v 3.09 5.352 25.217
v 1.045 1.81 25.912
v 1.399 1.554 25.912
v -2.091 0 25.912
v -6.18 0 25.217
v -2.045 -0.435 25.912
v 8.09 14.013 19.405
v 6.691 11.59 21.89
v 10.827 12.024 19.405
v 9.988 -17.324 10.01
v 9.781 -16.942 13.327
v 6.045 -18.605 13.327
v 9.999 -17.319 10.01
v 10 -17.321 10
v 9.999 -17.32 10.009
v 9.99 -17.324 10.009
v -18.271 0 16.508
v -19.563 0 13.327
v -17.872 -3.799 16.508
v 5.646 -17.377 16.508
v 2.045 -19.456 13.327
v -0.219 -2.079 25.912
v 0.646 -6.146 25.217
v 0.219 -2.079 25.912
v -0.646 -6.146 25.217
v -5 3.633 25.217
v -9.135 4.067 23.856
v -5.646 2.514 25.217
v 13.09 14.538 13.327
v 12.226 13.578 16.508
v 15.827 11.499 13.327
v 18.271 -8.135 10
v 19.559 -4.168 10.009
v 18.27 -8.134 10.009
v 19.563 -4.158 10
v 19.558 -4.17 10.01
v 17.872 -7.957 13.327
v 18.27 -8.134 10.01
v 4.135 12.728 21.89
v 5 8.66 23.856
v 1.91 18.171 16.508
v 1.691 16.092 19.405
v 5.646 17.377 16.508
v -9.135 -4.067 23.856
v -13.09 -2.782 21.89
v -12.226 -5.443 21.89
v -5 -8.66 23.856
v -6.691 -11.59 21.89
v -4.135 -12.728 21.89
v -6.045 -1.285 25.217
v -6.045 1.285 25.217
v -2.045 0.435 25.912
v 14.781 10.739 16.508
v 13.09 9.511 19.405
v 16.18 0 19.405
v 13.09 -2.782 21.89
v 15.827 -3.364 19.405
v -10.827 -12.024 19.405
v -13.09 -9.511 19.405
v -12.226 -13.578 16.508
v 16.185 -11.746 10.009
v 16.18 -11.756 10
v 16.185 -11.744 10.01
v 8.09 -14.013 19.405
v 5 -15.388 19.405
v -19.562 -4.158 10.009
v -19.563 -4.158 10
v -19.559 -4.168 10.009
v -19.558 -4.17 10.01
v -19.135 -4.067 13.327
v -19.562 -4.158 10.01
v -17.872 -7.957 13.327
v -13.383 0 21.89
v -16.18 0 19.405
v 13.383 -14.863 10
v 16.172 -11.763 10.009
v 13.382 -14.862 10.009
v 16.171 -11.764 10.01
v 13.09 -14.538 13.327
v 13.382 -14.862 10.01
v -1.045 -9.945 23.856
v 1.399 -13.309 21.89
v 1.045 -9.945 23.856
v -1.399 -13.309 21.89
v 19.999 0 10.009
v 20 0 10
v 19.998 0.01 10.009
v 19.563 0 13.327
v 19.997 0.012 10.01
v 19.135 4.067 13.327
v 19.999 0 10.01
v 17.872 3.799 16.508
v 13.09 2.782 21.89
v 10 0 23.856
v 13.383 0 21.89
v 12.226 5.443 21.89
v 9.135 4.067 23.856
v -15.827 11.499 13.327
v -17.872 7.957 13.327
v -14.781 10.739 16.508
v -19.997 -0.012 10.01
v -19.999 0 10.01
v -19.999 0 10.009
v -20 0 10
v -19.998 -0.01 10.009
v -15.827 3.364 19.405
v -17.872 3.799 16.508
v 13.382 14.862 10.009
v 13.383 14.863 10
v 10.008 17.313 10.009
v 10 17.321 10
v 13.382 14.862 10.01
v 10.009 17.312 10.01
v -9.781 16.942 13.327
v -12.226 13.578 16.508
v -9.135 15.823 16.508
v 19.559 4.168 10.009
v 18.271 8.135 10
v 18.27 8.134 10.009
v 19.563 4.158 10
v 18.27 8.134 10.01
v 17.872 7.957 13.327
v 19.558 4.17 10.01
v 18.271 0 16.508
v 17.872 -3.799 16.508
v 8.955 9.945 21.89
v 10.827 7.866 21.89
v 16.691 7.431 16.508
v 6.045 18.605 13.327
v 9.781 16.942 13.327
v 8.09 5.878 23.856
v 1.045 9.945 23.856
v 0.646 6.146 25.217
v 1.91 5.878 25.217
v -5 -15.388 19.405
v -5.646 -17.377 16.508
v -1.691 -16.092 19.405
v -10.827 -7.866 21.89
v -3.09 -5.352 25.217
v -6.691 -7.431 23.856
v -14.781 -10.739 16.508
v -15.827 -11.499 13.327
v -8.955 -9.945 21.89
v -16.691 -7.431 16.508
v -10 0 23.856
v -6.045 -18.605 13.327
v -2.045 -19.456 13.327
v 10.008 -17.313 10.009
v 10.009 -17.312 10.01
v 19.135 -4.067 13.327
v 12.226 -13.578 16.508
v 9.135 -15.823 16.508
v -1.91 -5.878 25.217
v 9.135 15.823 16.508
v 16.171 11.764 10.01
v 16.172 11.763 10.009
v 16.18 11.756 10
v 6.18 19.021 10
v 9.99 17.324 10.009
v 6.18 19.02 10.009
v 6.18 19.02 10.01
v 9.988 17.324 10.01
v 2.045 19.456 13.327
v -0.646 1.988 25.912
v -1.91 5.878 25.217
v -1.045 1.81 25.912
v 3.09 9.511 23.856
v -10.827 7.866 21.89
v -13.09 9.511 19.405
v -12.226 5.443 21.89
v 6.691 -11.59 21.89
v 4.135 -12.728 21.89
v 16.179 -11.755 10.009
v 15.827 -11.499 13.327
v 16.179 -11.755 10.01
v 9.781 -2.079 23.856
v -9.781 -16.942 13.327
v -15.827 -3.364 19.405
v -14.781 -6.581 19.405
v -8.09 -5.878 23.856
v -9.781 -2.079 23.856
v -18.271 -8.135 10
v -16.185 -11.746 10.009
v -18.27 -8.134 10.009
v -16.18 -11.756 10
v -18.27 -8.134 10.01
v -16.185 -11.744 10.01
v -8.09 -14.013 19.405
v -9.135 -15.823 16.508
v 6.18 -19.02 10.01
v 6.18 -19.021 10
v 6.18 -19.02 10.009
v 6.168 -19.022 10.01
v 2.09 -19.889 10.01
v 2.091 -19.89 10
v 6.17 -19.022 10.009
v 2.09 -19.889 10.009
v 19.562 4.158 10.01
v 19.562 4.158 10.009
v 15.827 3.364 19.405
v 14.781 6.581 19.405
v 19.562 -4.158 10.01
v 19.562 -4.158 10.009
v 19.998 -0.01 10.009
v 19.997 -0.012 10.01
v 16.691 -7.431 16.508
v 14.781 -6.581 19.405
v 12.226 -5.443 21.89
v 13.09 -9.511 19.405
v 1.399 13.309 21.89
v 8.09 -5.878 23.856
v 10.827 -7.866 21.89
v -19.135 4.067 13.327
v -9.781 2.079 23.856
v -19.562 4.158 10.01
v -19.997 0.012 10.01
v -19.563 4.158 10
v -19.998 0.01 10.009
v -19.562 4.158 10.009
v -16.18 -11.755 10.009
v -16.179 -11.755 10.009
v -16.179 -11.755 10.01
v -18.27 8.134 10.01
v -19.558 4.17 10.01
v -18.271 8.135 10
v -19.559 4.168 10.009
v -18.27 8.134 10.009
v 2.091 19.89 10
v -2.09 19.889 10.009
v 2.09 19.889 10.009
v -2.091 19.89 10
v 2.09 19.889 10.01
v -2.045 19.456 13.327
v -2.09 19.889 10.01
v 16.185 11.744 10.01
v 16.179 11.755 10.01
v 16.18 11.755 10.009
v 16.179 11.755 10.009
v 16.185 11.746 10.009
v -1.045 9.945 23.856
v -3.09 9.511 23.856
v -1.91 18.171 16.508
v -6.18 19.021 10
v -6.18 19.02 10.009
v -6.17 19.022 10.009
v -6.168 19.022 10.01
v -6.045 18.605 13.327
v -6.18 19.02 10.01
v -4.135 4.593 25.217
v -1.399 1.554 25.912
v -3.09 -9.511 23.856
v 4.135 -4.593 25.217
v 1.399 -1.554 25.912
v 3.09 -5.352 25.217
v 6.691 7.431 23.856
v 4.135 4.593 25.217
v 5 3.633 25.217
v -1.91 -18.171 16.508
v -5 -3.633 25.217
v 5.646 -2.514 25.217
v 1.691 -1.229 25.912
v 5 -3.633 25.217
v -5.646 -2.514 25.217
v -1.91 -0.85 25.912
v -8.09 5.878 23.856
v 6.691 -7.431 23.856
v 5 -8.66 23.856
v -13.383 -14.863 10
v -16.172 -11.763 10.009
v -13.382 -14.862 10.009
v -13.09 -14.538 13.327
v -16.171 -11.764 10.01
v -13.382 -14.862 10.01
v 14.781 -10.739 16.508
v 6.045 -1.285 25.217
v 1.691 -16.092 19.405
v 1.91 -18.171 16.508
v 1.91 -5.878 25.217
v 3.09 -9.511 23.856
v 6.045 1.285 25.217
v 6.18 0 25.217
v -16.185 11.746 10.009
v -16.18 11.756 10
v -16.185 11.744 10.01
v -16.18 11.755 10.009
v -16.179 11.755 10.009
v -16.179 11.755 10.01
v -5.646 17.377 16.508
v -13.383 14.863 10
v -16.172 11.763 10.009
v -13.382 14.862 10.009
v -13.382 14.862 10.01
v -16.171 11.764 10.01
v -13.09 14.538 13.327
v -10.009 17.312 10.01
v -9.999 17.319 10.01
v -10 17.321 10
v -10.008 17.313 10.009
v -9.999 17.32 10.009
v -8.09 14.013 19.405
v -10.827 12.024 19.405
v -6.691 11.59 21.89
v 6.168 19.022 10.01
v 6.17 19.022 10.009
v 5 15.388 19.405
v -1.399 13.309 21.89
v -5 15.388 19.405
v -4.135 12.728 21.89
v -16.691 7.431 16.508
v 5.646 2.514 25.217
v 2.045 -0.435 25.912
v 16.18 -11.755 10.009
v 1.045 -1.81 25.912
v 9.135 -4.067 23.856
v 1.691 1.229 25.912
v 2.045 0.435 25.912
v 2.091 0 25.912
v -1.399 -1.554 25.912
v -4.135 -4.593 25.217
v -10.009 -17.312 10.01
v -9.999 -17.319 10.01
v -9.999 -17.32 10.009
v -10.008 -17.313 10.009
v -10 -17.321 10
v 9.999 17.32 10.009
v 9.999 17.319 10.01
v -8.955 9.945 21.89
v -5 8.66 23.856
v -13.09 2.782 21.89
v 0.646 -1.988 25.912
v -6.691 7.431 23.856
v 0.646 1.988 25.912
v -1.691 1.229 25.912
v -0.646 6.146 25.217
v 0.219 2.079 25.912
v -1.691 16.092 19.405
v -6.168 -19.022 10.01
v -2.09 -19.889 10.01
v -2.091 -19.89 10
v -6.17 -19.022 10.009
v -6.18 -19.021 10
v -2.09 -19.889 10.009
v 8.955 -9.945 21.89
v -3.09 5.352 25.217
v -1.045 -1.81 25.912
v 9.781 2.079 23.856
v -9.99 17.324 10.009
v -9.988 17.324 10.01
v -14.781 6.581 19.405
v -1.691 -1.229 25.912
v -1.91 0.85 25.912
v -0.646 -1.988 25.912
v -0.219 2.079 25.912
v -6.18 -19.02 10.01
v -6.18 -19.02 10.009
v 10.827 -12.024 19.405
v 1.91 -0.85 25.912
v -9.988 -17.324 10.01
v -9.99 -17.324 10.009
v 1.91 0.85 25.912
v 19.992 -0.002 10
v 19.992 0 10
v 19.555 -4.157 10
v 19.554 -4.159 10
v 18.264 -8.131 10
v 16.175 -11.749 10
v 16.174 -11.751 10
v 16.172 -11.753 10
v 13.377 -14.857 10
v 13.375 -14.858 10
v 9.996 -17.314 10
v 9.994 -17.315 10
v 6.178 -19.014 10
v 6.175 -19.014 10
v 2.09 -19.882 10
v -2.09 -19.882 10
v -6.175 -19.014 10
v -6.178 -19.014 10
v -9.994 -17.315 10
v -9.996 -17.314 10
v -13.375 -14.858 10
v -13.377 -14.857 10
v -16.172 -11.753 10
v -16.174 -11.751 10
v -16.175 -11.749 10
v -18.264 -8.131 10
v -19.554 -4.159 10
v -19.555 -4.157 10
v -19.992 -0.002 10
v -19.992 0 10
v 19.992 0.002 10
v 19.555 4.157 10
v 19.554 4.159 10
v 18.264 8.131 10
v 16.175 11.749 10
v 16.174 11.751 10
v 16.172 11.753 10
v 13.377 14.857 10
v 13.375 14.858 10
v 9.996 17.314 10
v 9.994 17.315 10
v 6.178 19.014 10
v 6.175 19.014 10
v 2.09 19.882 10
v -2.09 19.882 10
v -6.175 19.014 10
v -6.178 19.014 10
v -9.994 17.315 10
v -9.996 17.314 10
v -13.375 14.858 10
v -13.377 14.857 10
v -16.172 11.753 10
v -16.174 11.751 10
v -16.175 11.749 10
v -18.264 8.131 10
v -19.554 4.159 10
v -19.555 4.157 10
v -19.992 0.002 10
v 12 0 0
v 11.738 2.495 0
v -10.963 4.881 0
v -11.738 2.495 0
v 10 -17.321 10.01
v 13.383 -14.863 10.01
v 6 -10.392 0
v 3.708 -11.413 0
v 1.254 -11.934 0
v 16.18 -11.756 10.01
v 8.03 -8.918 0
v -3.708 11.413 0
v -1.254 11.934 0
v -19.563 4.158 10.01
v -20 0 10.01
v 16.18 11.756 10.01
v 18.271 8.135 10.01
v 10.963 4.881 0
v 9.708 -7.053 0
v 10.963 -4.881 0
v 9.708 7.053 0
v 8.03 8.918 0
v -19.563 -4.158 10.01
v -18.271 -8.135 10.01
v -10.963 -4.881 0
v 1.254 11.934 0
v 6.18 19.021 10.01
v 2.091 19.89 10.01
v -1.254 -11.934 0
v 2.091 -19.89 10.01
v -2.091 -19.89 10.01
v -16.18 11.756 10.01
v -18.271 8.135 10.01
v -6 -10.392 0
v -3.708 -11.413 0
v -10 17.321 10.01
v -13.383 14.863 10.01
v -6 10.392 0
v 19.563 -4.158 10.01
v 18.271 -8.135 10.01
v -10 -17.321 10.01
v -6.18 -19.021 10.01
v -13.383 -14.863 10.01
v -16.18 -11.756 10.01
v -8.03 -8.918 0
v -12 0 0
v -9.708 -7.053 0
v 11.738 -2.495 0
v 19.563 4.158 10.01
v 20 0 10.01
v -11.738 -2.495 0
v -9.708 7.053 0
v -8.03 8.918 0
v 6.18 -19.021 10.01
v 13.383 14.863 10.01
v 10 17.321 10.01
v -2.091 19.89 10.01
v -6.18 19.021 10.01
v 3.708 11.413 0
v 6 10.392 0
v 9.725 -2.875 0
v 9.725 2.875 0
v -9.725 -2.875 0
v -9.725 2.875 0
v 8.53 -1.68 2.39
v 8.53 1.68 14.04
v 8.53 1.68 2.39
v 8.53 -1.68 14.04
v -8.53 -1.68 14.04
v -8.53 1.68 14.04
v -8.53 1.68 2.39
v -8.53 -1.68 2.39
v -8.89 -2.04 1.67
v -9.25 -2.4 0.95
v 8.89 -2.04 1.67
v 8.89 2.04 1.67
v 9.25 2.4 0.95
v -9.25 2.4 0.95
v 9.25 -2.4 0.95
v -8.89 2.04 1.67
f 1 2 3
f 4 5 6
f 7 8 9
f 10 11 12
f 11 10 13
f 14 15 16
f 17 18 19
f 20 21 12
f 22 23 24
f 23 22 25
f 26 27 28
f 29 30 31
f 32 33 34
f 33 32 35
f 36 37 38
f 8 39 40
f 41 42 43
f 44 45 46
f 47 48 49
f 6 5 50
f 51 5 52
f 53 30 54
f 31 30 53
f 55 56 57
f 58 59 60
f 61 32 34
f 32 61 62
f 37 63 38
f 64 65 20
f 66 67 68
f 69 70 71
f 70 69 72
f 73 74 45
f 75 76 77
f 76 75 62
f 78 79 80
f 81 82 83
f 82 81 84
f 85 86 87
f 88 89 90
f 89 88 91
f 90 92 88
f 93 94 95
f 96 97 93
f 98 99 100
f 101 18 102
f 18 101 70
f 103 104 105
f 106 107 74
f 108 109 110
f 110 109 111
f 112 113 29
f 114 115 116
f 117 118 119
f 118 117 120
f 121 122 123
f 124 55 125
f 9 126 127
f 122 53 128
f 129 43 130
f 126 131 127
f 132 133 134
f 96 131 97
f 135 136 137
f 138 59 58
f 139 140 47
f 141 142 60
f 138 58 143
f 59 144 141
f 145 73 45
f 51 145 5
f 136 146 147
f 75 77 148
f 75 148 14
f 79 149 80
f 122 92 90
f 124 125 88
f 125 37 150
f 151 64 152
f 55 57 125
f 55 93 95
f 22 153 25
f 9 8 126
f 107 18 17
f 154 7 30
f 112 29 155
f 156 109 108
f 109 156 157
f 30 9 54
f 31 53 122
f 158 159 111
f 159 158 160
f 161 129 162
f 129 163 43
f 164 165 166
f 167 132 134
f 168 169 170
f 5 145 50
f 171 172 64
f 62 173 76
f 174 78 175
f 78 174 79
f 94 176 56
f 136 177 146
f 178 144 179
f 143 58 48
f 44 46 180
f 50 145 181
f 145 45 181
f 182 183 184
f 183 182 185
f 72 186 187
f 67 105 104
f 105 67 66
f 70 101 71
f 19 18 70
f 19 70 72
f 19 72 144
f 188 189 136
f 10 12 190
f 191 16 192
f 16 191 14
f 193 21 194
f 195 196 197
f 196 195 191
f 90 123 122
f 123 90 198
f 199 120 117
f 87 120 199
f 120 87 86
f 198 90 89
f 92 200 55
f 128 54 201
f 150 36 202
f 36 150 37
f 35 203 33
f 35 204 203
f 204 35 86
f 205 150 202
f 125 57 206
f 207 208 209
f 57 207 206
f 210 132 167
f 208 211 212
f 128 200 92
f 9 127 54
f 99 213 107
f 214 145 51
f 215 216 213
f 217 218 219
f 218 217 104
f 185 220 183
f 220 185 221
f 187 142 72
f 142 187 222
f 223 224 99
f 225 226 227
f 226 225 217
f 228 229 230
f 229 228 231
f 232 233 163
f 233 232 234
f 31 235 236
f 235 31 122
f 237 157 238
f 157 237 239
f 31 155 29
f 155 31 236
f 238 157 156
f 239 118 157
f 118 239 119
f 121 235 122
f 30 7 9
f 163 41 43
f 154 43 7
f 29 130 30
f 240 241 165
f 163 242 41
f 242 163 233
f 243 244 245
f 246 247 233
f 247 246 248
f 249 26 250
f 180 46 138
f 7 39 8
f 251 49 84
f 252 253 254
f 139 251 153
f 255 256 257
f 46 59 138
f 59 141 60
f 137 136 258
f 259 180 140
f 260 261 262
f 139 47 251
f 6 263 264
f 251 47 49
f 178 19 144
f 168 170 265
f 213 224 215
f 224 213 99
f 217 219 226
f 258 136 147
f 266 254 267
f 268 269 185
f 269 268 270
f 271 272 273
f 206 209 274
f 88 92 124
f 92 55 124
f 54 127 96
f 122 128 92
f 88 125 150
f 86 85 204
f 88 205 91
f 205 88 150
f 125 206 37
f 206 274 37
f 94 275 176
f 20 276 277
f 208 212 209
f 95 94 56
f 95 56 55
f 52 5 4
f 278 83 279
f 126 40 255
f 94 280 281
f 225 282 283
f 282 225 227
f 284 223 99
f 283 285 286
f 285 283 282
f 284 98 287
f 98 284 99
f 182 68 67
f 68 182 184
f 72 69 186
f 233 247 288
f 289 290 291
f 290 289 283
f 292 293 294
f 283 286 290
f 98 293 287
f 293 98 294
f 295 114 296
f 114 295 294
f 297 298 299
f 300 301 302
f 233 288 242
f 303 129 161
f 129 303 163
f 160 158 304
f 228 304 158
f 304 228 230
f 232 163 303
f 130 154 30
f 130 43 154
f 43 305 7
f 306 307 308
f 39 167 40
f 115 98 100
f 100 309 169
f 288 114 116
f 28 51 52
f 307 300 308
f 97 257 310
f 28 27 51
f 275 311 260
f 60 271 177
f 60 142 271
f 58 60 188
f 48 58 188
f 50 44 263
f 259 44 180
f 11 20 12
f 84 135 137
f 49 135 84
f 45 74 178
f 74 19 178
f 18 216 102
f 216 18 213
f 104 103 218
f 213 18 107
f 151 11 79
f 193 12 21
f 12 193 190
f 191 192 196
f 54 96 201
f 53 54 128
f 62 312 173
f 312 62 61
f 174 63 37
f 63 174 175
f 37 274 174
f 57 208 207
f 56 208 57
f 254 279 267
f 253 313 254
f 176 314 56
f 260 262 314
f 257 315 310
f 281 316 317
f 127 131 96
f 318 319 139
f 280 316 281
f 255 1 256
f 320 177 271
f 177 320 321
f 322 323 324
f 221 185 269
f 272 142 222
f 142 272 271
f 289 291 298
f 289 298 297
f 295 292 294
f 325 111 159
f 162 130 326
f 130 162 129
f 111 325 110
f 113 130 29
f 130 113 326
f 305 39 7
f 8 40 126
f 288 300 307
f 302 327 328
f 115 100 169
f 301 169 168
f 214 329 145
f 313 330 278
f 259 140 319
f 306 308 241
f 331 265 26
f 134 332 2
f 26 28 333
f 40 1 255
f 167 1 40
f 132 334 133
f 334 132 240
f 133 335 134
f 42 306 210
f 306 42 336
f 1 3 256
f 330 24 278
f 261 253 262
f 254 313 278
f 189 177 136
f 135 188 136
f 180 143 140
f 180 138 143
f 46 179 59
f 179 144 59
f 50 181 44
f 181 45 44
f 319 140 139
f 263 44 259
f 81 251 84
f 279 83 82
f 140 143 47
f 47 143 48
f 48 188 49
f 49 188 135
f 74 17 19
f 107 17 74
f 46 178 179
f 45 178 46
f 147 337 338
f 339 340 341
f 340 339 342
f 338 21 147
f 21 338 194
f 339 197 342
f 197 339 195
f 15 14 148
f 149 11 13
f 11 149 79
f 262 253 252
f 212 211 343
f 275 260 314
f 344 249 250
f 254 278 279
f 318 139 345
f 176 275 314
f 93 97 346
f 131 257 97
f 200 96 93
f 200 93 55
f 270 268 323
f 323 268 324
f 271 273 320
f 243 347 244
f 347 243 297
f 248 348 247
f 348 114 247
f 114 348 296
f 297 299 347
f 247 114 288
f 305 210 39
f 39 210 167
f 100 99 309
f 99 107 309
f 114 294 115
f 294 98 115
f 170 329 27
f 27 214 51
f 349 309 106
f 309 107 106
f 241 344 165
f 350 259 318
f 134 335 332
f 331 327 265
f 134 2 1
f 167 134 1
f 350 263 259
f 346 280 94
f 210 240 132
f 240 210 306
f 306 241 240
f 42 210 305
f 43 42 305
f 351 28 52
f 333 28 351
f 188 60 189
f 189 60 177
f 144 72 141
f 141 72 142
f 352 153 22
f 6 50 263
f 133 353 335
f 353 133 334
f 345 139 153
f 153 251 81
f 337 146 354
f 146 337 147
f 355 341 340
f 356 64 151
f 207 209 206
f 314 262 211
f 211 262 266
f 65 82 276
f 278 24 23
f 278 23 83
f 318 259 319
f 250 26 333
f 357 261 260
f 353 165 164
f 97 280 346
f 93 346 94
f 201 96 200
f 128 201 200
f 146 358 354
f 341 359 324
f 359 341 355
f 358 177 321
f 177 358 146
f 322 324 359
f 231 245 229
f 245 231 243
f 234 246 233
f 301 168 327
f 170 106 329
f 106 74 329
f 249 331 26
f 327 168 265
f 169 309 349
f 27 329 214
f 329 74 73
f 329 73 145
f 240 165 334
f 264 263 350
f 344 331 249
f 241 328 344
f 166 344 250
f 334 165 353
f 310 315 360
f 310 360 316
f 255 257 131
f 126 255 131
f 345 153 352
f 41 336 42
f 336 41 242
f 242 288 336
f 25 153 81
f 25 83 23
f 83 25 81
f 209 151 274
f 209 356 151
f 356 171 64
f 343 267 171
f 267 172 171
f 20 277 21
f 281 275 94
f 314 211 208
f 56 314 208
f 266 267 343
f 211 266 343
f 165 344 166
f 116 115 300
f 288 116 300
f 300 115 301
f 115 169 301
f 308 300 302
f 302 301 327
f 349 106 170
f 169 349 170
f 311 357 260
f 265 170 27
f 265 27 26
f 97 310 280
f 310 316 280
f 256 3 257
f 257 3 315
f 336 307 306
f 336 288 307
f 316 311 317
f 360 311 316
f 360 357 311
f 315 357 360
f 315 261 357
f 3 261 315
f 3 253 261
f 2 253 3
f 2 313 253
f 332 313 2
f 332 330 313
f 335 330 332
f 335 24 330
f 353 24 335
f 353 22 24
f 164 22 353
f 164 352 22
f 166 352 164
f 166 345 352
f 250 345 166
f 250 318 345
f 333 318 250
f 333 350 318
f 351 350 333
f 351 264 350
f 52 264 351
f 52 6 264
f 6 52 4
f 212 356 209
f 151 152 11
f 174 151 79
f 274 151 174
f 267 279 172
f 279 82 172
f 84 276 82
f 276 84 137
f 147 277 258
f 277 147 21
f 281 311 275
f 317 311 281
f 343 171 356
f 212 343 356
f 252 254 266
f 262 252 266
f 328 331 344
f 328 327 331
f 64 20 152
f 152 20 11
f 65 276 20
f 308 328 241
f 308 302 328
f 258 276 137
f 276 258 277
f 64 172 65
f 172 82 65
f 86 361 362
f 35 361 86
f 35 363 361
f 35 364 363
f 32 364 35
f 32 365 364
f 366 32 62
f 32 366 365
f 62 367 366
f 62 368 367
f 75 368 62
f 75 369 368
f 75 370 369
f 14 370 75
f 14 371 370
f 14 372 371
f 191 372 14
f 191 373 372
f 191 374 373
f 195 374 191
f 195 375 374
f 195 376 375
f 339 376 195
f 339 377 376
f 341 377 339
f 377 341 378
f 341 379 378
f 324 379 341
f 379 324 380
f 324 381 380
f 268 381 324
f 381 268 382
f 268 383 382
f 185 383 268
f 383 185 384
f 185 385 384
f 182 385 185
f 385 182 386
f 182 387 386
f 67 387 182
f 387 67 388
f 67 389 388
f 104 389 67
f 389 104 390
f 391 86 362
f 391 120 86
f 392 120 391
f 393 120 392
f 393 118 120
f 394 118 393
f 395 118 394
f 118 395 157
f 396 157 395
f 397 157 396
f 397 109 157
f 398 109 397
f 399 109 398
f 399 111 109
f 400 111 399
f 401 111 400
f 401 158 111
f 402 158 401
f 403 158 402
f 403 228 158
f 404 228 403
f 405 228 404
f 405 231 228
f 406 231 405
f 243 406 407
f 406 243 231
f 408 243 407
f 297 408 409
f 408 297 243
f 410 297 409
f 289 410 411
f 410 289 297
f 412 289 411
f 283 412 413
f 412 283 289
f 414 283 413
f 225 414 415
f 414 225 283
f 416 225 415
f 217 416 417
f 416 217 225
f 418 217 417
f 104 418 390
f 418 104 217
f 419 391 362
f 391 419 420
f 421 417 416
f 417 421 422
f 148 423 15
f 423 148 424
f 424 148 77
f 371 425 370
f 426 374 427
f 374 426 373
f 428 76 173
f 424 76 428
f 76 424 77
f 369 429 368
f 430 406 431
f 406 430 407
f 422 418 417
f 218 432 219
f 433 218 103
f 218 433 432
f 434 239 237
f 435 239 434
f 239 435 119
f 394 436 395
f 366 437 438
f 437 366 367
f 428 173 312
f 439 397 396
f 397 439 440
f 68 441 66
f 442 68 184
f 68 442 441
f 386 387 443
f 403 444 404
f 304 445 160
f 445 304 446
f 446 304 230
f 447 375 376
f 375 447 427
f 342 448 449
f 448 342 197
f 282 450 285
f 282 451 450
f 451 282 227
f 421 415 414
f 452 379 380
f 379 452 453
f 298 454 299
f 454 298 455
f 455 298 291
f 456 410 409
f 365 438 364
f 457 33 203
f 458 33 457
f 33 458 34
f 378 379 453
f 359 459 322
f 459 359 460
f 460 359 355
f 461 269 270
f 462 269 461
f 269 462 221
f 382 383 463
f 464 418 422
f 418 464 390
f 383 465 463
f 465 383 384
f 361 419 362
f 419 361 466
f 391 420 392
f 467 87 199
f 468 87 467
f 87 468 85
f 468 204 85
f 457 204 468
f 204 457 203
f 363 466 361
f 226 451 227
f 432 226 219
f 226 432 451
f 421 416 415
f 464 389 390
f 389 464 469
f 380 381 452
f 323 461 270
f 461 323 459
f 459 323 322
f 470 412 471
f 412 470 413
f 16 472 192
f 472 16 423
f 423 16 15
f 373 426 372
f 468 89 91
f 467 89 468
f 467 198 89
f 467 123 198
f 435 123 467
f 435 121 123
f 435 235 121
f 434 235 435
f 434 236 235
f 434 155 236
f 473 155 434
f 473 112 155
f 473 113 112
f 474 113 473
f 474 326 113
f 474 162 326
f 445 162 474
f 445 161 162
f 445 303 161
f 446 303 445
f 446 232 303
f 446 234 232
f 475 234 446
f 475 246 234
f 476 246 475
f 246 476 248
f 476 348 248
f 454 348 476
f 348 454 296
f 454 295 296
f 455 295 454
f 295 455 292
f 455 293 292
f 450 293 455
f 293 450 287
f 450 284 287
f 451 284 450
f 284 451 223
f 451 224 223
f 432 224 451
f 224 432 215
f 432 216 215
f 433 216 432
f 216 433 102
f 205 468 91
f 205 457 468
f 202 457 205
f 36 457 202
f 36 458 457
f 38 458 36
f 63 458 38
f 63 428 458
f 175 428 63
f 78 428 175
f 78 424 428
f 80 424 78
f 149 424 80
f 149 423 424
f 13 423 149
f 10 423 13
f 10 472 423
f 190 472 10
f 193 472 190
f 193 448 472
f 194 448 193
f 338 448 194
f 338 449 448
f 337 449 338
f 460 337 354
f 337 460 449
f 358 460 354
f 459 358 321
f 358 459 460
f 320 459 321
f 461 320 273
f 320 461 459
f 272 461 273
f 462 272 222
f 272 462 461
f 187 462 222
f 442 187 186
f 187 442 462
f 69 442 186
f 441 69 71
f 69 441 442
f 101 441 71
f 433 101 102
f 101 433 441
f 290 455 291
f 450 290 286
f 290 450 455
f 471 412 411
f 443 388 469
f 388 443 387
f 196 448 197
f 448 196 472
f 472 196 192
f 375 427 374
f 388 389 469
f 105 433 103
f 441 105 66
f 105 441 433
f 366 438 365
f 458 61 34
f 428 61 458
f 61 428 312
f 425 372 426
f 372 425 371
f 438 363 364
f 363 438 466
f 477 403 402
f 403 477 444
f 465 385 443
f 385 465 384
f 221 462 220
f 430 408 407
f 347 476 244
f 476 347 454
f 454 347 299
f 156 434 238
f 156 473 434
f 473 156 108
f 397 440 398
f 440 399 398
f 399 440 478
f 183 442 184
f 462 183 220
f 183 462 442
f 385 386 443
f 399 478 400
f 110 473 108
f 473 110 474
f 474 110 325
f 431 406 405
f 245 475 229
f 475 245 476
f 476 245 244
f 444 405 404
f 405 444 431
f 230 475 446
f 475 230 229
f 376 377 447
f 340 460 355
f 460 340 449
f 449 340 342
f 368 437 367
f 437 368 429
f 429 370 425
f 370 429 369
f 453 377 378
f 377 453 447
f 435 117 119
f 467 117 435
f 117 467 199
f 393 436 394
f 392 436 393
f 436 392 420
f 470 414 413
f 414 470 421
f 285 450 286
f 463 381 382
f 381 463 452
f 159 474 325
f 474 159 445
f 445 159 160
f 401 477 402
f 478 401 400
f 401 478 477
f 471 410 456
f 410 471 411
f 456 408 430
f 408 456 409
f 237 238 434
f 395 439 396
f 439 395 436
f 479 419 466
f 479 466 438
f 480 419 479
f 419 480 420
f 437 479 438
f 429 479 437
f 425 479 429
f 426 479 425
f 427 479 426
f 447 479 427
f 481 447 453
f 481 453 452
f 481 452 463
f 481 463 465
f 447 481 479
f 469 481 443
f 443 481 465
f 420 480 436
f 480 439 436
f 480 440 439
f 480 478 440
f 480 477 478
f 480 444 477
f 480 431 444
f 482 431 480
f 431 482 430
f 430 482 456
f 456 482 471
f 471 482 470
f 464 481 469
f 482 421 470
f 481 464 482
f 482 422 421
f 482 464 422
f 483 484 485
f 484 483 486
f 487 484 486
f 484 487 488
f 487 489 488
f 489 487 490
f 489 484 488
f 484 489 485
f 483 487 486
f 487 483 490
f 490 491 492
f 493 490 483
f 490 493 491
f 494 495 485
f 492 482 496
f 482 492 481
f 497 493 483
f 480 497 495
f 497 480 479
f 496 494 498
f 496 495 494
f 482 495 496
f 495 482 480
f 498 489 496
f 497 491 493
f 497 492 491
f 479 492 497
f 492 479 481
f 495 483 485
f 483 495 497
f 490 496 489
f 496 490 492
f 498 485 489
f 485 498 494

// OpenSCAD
slotTolerance = 0.08;
slotWidth = 16.9;
slotThickness = 3.2;
slotHeight = 14;
bottomSlotExtra = 1.2;
baseDiameter = 24;
baseHeight = 10;
sphereDiameter = 40;
verticalSphereStretch = 0.8;

module end_of_parameters_dummy() {}


//BEGIN: use <tubemesh.scad>;

//BEGIN: use <eval.scad>;
function _isString(v) = v >= "";
function _isVector(v) = !(v>="") && len(v) != undef;
function _isFloat(v) = v+0 != undef;

function _substr(s, start=0, stop=undef, soFar = "") =
    start >= (stop==undef ? len(s) : stop) ? soFar :
        _substr(s, start=start+1, stop=stop, soFar=str(soFar, s[start]));

function _parseInt(s, start=0, stop=undef, accumulated=0) =
    let( stop = stop==undef ? len(s) : stop )
        start >= stop ? accumulated :
        s[start] == "+" ? _parseInt(s, start=start+1, stop=stop) :
        s[start] == "-" ? -_parseInt(s, start=start+1, stop=stop) :
        let (digit = search(s[start], "0123456789"))
            digit == [] ? 0 : _parseInt(s, start=start+1, stop=stop, accumulated=accumulated*10+digit[0]);

function _findNonDigit(s, start=0) =
    start >= len(s) || s[start]<"0" || s[start]>"9" ? start :
    _findNonDigit(s, start=start+1);

function _replaceChar(s,c1,c2,pos=0,soFar="") =
    pos >= len(s) ? soFar :
    _replaceChar(s,c1,c2,pos=pos+1,soFar=str(soFar, s[pos]==c1 ? c2 : s[pos]));

function _parseUnsignedFloat(s) =
    len(s) == 0 ? 0 :
        let(
            firstNonDigit = _findNonDigit(s),
            decimalPart = s[firstNonDigit]!="." ?
                [firstNonDigit,firstNonDigit] : [firstNonDigit+1, _findNonDigit(s, start=firstNonDigit+1)],
            intPart = _parseInt(s,start=0,stop=firstNonDigit),
            fractionPart = _parseInt(s,start=decimalPart[0],stop=decimalPart[1]),
            baseExp = s[decimalPart[1]]=="e" || s[decimalPart[1]]=="E" ? pow(10,_parseInt(s, start=decimalPart[1]+1)) : 1)
            (intPart+fractionPart*pow(10,-(decimalPart[1]-decimalPart[0])))*baseExp;

function _tail(v) = len(v)>=2 ? [for(i=[1:len(v)-1]) v[i]] : [];
function _isspace(c) = (" " == c || "\t" == c || "\r" == c || "\n" == c );
function _isdigit(c) = ("0" <= c && c <= "9" );
function _isalpha(c) = ("a" <= c && c <= "z") || ("A" <= c && c <= "Z");
function _isalpha_(c) = _isalpha(c)  || c=="_";
function _isalnum_(c) = _isalpha(c) || _isdigit(c) || c=="_";
function _flattenLists(ll) = [for(a=ll) for(b=a) b];

function _spaceSequence(s, start=0, count=0) =
    len(s)>start && _isspace(s[start]) ? _spaceSequence(s, start=start+1, count=count+1) : count;
function _digitSequence(s, start=0, count=0) =
    len(s)>start && _isdigit(s[start]) ? _digitSequence(s, start=start+1,count=count+1) : count;
function _alnum_Sequence(s, start=0, count=0) =
    len(s)>start && _isalnum_(s[start]) ? _alnum_Sequence(s, start=start+1,count=count+1) : count;
function _identifierSequence(s, start=0, count=0) =
    len(s)>start && _isalpha_(s[start]) ? _alnum_Sequence(s, start=start+1, count=count+1) : count;
function _signedDigitSequence(s, start=0) =
    len(s) <= start ? 0 :
        (s[start] == "+" || s[start] == "-" ) ? 1+_digitSequence(s,start=start+1) : _digitSequence(s,start=start);
function _realStartingWithDecimal(s, start=0) =
    len(s)>start && s[start] == "." ?
        let(next = start+1+_digitSequence(s, start=start+1))
        (s[next] == "e" || s[next] == "E" ?
            next-start+1+_signedDigitSequence(s, start=next+1) : next-start)
        : 0;
function _realContinuation(s, start=0) =
    len(s) <= start ? 0 :
        let(c1=_realStartingWithDecimal(s, start=start))
        c1 > 0 ? c1 :
        s[start] == "e" || s[start] == "E" ?
            1+_signedDigitSequence(s, start=start+1) : 0;
function _positiveRealSequence(s, start=0) =
    len(s) <= start ? 0 :
        let(c1 = _realStartingWithDecimal(s, start=start))
            c1 > 0 ? c1 :
        let(c2 = _digitSequence(s, start=start))
            c2 > 0 ? c2 + _realContinuation(s, start=start+c2) : 0;

_multiSymbolOperators = [ "<=", ">=", "==", "&&", "||" ]; // must be in order of decreasing length

function _multiSymbolOperatorSequence(s, start=0) =
    (s[start]=="<" && s[start+1]=="=") ||
    (s[start]==">" && s[start+1]=="=") ||
    (s[start]=="=" && s[start+1]=="=") ||
    (s[start]=="!" && s[start+1]=="=") ||
    (s[start]=="&" && s[start+1]=="&") ||
    (s[start]=="|" && s[start+1]=="|") ? 2 : 0;

function _tokenize(s, start=0) =
    start >= len(s) ? [] :
    let(c1=_spaceSequence(s, start=start)) c1>0 ?
        concat([" "], _tokenize(s, start=start+c1)) :
    let(c2=_identifierSequence(s, start=start)) c2>0 ?
        concat([_substr(s, start=start, stop=start+c2)], _tokenize(s, start=start+c2)) :
    let(c3=_positiveRealSequence(s, start=start)) c3>0 ?
        concat([_substr(s, start=start, stop=start+c3)], _tokenize(s, start=start+c3)) :
    let(c4=_multiSymbolOperatorSequence(s, start=start)) c4>0 ?
        concat([_substr(s, start=start, stop=start+c4)], _tokenize(s, start=start+c4)) :
        concat([s[start]], _tokenize(s, start=start+1));


function _endParens(list,start=0,openCount=0,stop=undef) =
    let(stop = stop==undef ? len(list) : stop)
    start >= stop ? (openCount?undef:stop) :
    list[start][0] == ")" ?
            (openCount==1 ? start+1 : _endParens(list,start+1,stop=stop, openCount=openCount-1)) :
    _endParens(list,start+1,stop=stop, openCount=
        list[start][0] == "(" ?
            openCount+1 : openCount);

function _indexInTable(string, table, column=0) =
    let (s=search([string], table, index_col_num=column))
        s[0] == [] ? -1 : s[0][0];

_NAME = 0;
_ARITY = 1;
_PREC = 2;
_ASSOC_DIR = 3;
_ARGUMENTS_FROM_VECTOR = 4;
_OPERATOR = 5;
_EXTRA_DATA = 6;

function _func(op) = [ op, 1, -1, 1, true, op ];

_operators = [
    [ "[", 1, -1, 1, true, "[" ],
    [ "pow", 1, -1, 1, true, "^" ],
    [ "cross", 1, -1, 1, true, "cross" ],
    _func("sqrt"),
    _func("cos"),
    _func("sin"),
    _func("tan"),
    _func("acos"),
    _func("asin"),
    _func("atan"),
    _func("COS"),
    _func("SIN"),
    _func("TAN"),
    _func("ACOS"),
    _func("ASIN"),
    _func("ATAN"),
    _func("abs"),
    _func("ceil"),
    _func("exp"),
    _func("floor"),
    _func("ln"),
    _func("log"),
    _func("round"),
    _func("sign"),
    _func("norm"),
    [ "atan2", 1, -1, 1, true, "atan2" ],
    [ "ATAN2", 1, -1, 1, true, "ATAN2" ],
    [ "max", 1, -1, 1, true, "max" ],
    [ "min", 1, -1, 1, true, "min" ],
    [ "concat", 1, -1, 1, true, "concat" ],
    [ "#", 2, 0, -1, false, "#" ],
    [ "^", 2, 0, -1, false, "^" ],
    [ "#-",1, 0.5, 0, true, "-" ],
    [ "#+",1, 0.5, 0, true, "+" ],
    [ "*", 2, 1, 1, false, "*" ],
    [ "/", 2, 1, 1, false, "/" ],
    [ "%", 2, 1, 1, false, "%" ],
    [ "+", 2, 2, 1, true, "+" ],
    [ "-", 2, 2, 1, true, "-" ],
    [ "!=", 2, 3, 1, true, "!=" ],
    [ "==", 2, 3, 1, true, "==" ],
    [ "<=", 2, 3, 1, true, "<=" ],
    [ ">=", 2, 3, 1, true, ">=" ],
    [ "<", 2, 3, 1, true, "<" ],
    [ ">", 2, 3, 1, true, ">" ],
    [ "!", 1, 4, 1, true, "!" ],
    [ "&&", 2, 5, 1, true, "&&" ],
    [ "||", 2, 5, 1, true, "||" ],
    [ "?", 2, 10, -1, true, "?" ],
    [ ":", 2, 10, -1, true, ":" ],
    [ "=", 2, 30, 1, true, "=" ], // for let()
    [ "let", 1, 25, 1, true, "let" ],
    [ ",", 2, 100, 1, true, "," ]
   ];

_binary_or_unary = [ ["-", "#-"], ["+", "#+"], ["#", "["] ];

// insert parentheses in some places to tweak the order of
// operations in those contexts
function _fixBrackets(pretok,start=0) =
    start >= len(pretok) ? [] :
    pretok[start] == "[" ?
        concat(["#", "("], _fixBrackets(pretok,start=start+1)) :
    pretok[start] == "]" ?
        concat([")"], _fixBrackets(pretok,start=start+1)) :
    pretok[start] == "?" ?
        concat([pretok[start],"("], _fixBrackets(pretok,start=start+1)) :
    pretok[start] == ":" ?
        concat([")",pretok[start]], _fixBrackets(pretok,start=start+1)) :
        concat(pretok[start], _fixBrackets(pretok,start=start+1));

// disambiguate operators that can be unary or binary
function _fixUnaries(pretok) =
    [ for (i=[0:len(pretok)-1])
         let (
            a = pretok[i],
            j=_indexInTable(a, _binary_or_unary))
            (0 <= j && (i == 0 || pretok[i-1] == "(" ||
                0 <= _indexInTable(pretok[i-1], _operators)))? _binary_or_unary[j][1] : a ];

function _fixLet1(tok, start=0, stop=undef) =
    let (stop = stop==undef ? len(tok) : stop)
        start >= stop ? [] :
        tok[start][0] == "let"?
           let(endP=_endParens(tok,start=start+1,stop=stop,openCount=0)) concat([concat(tok[start], [_fixLet1(tok,start=start+2,stop=endP-1)])], _fixLet1(tok,start=endP,stop=stop)) :
        concat([tok[start]], _fixLet1(tok,start=start+1,stop=stop));

function _parsePass1(s) =
    let (pretok=_fixUnaries(_fixBrackets(_tokenize(s))))
    _fixLet1(
    [ for (i=[0:len(pretok)-1])
        let (a=pretok[i])
        if (a[0] != " ")
            let (j=_indexInTable(a, _operators))
                j >= 0 ? _operators[j] : [a] ] );

function _prec(op1, pos1, op2, pos2) =
    op1 != undef && op2 == undef ? false :
    op1 == undef && op2 != undef ? true :
    op1 == undef && op2 == undef ? true :
    op1[_ARITY] == 1 && pos1 > pos2 ? true :
    op2[_ARITY] == 1 && pos2 > pos1 ? false :
    op1[_PREC] < op2[_PREC] ? true :
        op2[_PREC] < op1[_PREC] ? false :
            op1[_ASSOC_DIR] * pos1 < op2[_ASSOC_DIR] * pos2;

function _parseLiteralOrVariable(s) =
        s == "PI" ? PI :
        s == "true" ? true :
        s == "false" ? false :
        s == "undef" ? undef :
        _isalpha_(s[0]) ? s :
        _parseUnsignedFloat(s);

function _isoperator(token) = _PREC<len(token);

function _getCandidatesForMainOperator(tok,start,stop) =
   start >= stop ? [] :
   tok[start][0] == "(" ?
        _getCandidatesForMainOperator(tok,_endParens(tok,start=start+1,stop=stop,openCount=1),stop)
        :
        _isoperator(tok[start]) ? concat([[tok[start],start]],_getCandidatesForMainOperator(tok,start+1,stop)) :
        _getCandidatesForMainOperator(tok,start+1,stop);

// Find the operator with least precedence
function _findMainOperatorPos(candidates,start=0) =
    len(candidates) <= start ? undef :
    let(rest=_findMainOperatorPos(candidates,start+1))
    _prec(candidates[rest][0], rest, candidates[start][0], start) ? start : rest;

function _firstOccurrence(c,opName,start=0) =
    start >= len(c) ? undef :
    c[start][0][0] == opName ? c[start] :
        _firstOccurrence(c,opName,start=start+1);

// We know the main operator is a ? or a :. We now need to find out which.
function _mainQuestionOperator(c) =
    let(fq = _firstOccurrence(c,"?"),
        fc = _firstOccurrence(c,":"))
        fq[1] != undef && (fc[1] == undef || fq[1] < fc[1]) ? fq : fc;

function _mainOperator(tok,start,stop) =
    let(c=_getCandidatesForMainOperator(tok,start,stop),
        pos=_findMainOperatorPos(c),
        m=c[pos])
        m[0][0] == "?" ?
            concat(m, [_firstOccurrence(c,":",start=pos+1)[1]])
            : m;

function _doLets(assignments, final, start=0) =
    start >= len(assignments) ? final :
    assignments[start][0] == "=" ? ["let", ["'", assignments[start][1]], assignments[start][2], _doLets(assignments, final, start=start+1)] : _doLets(assignments, final, start=start+1);

function _letOperator(a,b) =
    let(rawAssignments=_fixCommas(a),
        assignments=rawAssignments[0] == "[[" ?
            _tail(rawAssignments) : [a])
    _doLets(assignments, b);

/* This takes a fully tokenized vector, each element of which is either a line from the _operators table or a vector containing a single non-operator string, and parses it using general parenthesis and operator parsing. Comma expressions for building vectors will be parsed in the next pass. */
function _parseMain(tok,start=0,stop=undef) =
    let( stop= stop==undef ? len(tok) : stop )
        stop <= start ? undef :
        tok[start][0] == "(" && _endParens(tok,start=start+1,stop=stop,openCount=1)==stop ?
            _parseMain(tok,start=start+1,stop=stop-1) :
        let( lp = _mainOperator(tok,start,stop) )
            lp[0] == undef ? ( stop-start>1 ? undef : _parseLiteralOrVariable(tok[start][0]) ) :
            let( op = lp[0], pos = lp[1] )
                op[_NAME] == "?" ?
                    [ op[_OPERATOR], _parseMain(tok,start=start,stop=pos), _parseMain(tok,start=pos+1,stop=lp[2]), _parseMain(tok,start=lp[2]+1,stop=stop) ] :
                op[_NAME] == "let" ?
                    _letOperator( _parseMain(op[_EXTRA_DATA]), _parseMain(tok,start=pos+1,stop=stop)) :
                op[_ARITY] == 2 ?
                    (start==pos ?
                    /* unary */

                    let(j=_indexInTable(op[_OPERATOR], _binary_or_unary)) [ _binary_or_unary[j][1],_parseMain(tok,start=pos+1,stop=stop)] : [ op[_OPERATOR], _parseMain(tok,start=start,stop=pos), _parseMain(tok,start=pos+1,stop=stop)])
                    : [ op[_OPERATOR], _parseMain(tok,start=pos+1,stop=stop) ];


// this upgrades sequences of binary commas to vectors
function _fixCommas(expression) =
    expression[0] == "," ?
        let(a=_fixCommas(expression[1]),
            b=_fixCommas(expression[2]))
            a[0] == "[[" ?
                concat(["[["],concat(_tail(a), [b])) :
                ["[[",a,b]
        :
    _isVector(expression) ?
            concat([expression[0]], [for (i=[1:len(expression)-1]) _fixCommas(expression[i])]) :
            expression;

// fix arguments from vectors
function _fixArguments(expression) =
    let(i=_indexInTable(expression[0], _operators, _OPERATOR))
            i >=0 && _operators[i][_ARGUMENTS_FROM_VECTOR] && expression[1][0] == "[[" ? concat([expression[0]], [for (i=[1:len(expression[1])-1]) _fixArguments(expression[1][i])]) :
/*            expression[0] == "?" ?
                concat([expression[0],expression[1]],[for (i=[1:len(expression[2])-1]) _fixArguments(expression[2][i])]) : */
            len(expression)>1 && !_isString(expression) ?
                concat([expression[0]], [for (i=[1:len(expression)-1]) _fixArguments(expression[i])])
                    : expression;

function _optimizedLiteral(x) =
    len(x)==undef ? x : ["'", x];

function _wellDefined(x) =
    x==undef ? false :
    len(x)==undef ? true :
    x[0] == "'" ? true :
    len(x)==1 ? x[0]!=undef :
    len([for (a=x) if(!_wellDefined(a)) true])==0;

function _optimize(expression) =
    let(x=eval(expression,$careful=true))
        _wellDefined(x) ? _optimizedLiteral(x) :
        expression[0] == "'" ? _optimizedLiteral(x) :
        ! _isString(expression) ?
            concat([expression[0]], [for(i=[1:len(expression)-1]) (i>1 || expression[0] != "let") ?  _optimize(expression[i]) : expression[i]]) :
        expression;

function compileFunction(expression,optimize=true) =
            _isVector(expression) ? expression :
            _isFloat(expression) ? expression :
            let(unoptimized = _fixArguments(_fixCommas(_parseMain(_parsePass1(expression)))))
        optimize ? _optimize(unoptimized) : unoptimized;

function evaluateFunction(expression,variables) = eval(compileFunction(expression,optimize=false),variables);

function _let(v, var, value) = concat([var, value], v);

function _lookupVariable(var, table) =
    let (s=search([var], table, index_col_num=0))
        s[0] == [] ? undef : table[s[0][0]][1];

function _generate(var, range, expr, v) =
    [ for(i=range) eval(expr, _let(v, var, i)) ];

function _safeNorm(v) =
    ! _isVector(v) || len([for (x=v) x+0==undef]) ? undef : norm(v);

function eval(c,v=[]) =
    ""<=c ? _lookupVariable(c,v) :
    let(op=c[0]) (
    op == undef ? c :
    op == "'" ? c[1] :
    op == "+" ? (len(c)==2 ? eval(c[1],v) : eval(c[1],v)+eval(c[2],v)) :
    op == "-" ? (len(c)==2 ? -eval(c[1],v) : eval(c[1],v)-eval(c[2],v)) :
    op == "*" ? eval(c[1],v)*eval(c[2],v) :
    op == "/" ? eval(c[1],v)/eval(c[2],v) :
    op == "%" ? eval(c[1],v)%eval(c[2],v) :
    op == "sqrt" ? sqrt(eval(c[1],v)) :
    op == "^" || op == "pow" ? pow(eval(c[1],v),eval(c[2],v)) :
    op == "cos" ? cos(eval(c[1],v)) :
    op == "sin" ? sin(eval(c[1],v)) :
    op == "tan" ? tan(eval(c[1],v)) :
    op == "acos" ? acos(eval(c[1],v)) :
    op == "asin" ? asin(eval(c[1],v)) :
    op == "atan" ? atan(eval(c[1],v)) :
    op == "atan2" ? atan2(eval(c[1],v),eval(c[2],v)) :
    op == "COS" ? cos(eval(c[1],v)*180/PI) :
    op == "SIN" ? sin(eval(c[1],v)*180/PI) :
    op == "TAN" ? tan(eval(c[1],v)*180/PI) :
    op == "ACOS" ? acos(eval(c[1],v))*PI/180 :
    op == "ASIN" ? asin(eval(c[1],v))*PI/180 :
    op == "ATAN" ? atan(eval(c[1],v))*PI/180 :
    op == "ATAN2" ? atan2(eval(c[1],v),eval(c[2],v))*PI/180 :
    op == "abs" ? abs(eval(c[1],v)) :
    op == "ceil" ? ceil(eval(c[1],v)) :
    op == "cross" ? cross(eval(c[1],v),eval(c[2],v)) :
    op == "exp" ? exp(eval(c[1],v)) :
    op == "floor" ? floor(eval(c[1],v)) :
    op == "ln" ? ln(eval(c[1],v)) :
    op == "len" ? len(eval(c[1],v)) :
    op == "log" ? log(eval(c[1],v)) :
    op == "max" ? (len(c) == 2 ? max(eval(c[1],v)) : max([for(i=[1:len(c)-1]) eval(c[i],v)])) :
    op == "min" ? (len(c) == 2 ? min(eval(c[1],v)) : min([for(i=[1:len(c)-1]) eval(c[i],v)])) :
    op == "norm" ?
        (!$careful ? norm(eval(c[1],v)) : _safeNorm(eval(c[1],v))) :
    op == "rands" ? rands(eval(c[1],v),eval(c[2],v),eval(c[3],v),eval(c[4],v)) :
    op == "round" ? round(eval(c[1],v)) :
    op == "sign" ? sign(eval(c[1],v)) :
    op == "[" ? [for (i=[1:len(c)-1]) eval(c[i],v)] :
    op == "#" ? eval(c[1],v)[eval(c[2],v)] :
    op == "<" ? eval(c[1],v)<eval(c[2],v) :
    op == "<=" ? eval(c[1],v)<=eval(c[2],v) :
    op == ">=" ? eval(c[1],v)>=eval(c[2],v) :
    op == ">" ? eval(c[1],v)>=eval(c[2],v) :
    op == "==" ? (!$careful ? eval(c[1],v)==eval(c[2],v) :
        (let(c1=eval(c[1],v))
        c1==undef ? undef :
        let(c2=eval(c[2],v))
        c2==undef ? undef :
        c1 == c2) ) :
    op == "!=" ? (!$careful ? eval(c[1],v)!=eval(c[2],v) :
        (let(c1=eval(c[1],v))
        c1==undef ? undef :
        let(c2=eval(c[2],v))
        c2==undef ? undef :
        c1 != c2) ) :
    op == "&&" ? (!$careful ? eval(c[1],v)&&eval(c[2],v) :
        (let(c1=eval(c[1],v))
        c1==undef ? undef :
        !c1 ? false :
        let(c2=eval(c[2],v))
        c2==undef ? undef :
        c1 && c2) ) :
    op == "||" ? (!$careful ? eval(c[1],v)||eval(c[2],v) :
        (let(c1=eval(c[1],v))
        c1==undef ? undef :
        c1 ? true :
        let(c2=eval(c[2],v))
        c2==undef ? undef :
        c1 || c2) ) :
    op == "!" ? (!$careful ? !eval(c[1],v) :
        (let(c1=eval(c[1],v))
        c1==undef ? undef :
        !c1) ) :
    op == "?" ? (!$careful ? (eval(c[1],v)?eval(c[2],v):eval(c[3],v)) :
        (let(c1=eval(c[1],v))
        c1==undef ? undef :
        c1 ? eval(c[2],v):eval(c[3],v)) ):

    op == "concat" ? [for (i=[1:len(c)-1]) let(vect=eval(c[i],v)) for(j=[0:len(vect)-1]) vect[j]] :
    op == "range" ? (len(c)==3 ? [eval(c[1],v):eval(c[2],v)] : [eval(c[1],v):eval(c[2],v):eval(c[3],v)]) :
    op == "let" ? (!$careful ? eval(c[3],concat([[eval(c[1],v),eval(c[2],v)]], v)) :
            let(c1=eval(c[1],v),c2=eval(c[2],v))
                c1==undef || c2==undef ? undef :
                    eval(c[3],concat([[c1,c2]], v)) ) :
    op == "gen" ? _generate(eval(c[1],v),eval(c[2],v),c[3],v) :
    undef
    );

// per 10,000 operations with "x^3*y-x*y^3"
// 24 sec compile
// 21 sec unoptimized compile
// 22 sec evaluateFunction()
// 0.7 sec eval

// pass1 10 seconds [tokenize: 4 seconds]
// parseMain 6
// fixCommas 0
// fixArguments 3
// optimize 3
/*
echo(compileFunction("x^(2*3)"));
fc = compileFunction("x^3*y-x*y^3",optimize=true);
echo(fc);
echo(eval(fc,[["x",1],["y",1]]));
z=[for(i=[0:9999]) compileFunction("x^3*y-x*y^3",optimize=false)];//fc,[ ["x",1],["y",2] ])];
*/

//z = [for(i=[1:10000]) compileFunction("x^3*y-x*y^3")];
// normal: 23

//function repeat(s, copies, soFar="") = copies <= 0 ? soFar : repeat(s, copies-1, soFar=str(soFar,s));

//END: use <eval.scad>;


// params = [sections,sectionCounts]

// written for tail-recursion
// _subtotals[i] = list[0] + ... + list[i-1]
function _subtotals(list,soFar=[]) =
        len(soFar) >= 1+len(list) ? soFar :
        _subtotals(list,
            let(n1=len(soFar))
            concat(soFar, n1>0 ? soFar[n1-1]+list[n1-1] : 0));

function _flatten(list) = [for (a=list) for(b=a) b];

function _reverseTriangle(t) = [t[2], t[1], t[0]];

// smallest angle in triangle
function _minAngle(p1,p2,p3) =
    let(a = p2-p1,
        b = p3-p1,
        c = p3-p2,
        v1 = a*b,
        v2 = -(c*a))
        v1 == 0 || v2 == 0 ? 0 :
        let( na = norm(a),
             a1 = acos(v1 / (na*norm(b))),
             a2 = acos(v2 / (na*norm(c))) )
        min(a1,a2,180-(a1+a2));

// triangulate square to maximize smallest angle
function _doSquare(points,i11,i21,i22,i12,optimize=true) =
    points[i11]==points[i12] ? [[i11,i21,i22]] :
    points[i21]==points[i22] ? [[i22,i12,i11]] :
    !optimize ? [[i11,i21,i22], [i22,i12,i11]] :
    let (m1 = min(_minAngle(points[i11],points[i21],points[i22]), _minAngle(points[i22],points[i12],points[i11])),
        m2 = min(_minAngle(points[i11],points[i21],points[i12]),
                _minAngle(points[i21],points[i22],points[i12])) )
        m2 <= m1 ? [[i11,i21,i22], [i22,i12,i11]] :
                  [[i11,i21,i12], [i21,i22,i12]];

/*
function _inTriangle(v1,t) = (v1==t[0] || v1==t[1] || v1==t[2]);

function _findTheDistinctVertex(t1,t2) =
    let(in = [for(i=[0:2]) _inTriangle(t1[i],t2)])
    ! in[0] && in[1] && in[2] ? 0 :
    ! in[1] && in[0] && in[2] ? 1 :
    ! in[2] && in[0] && in[1] ? 2 :
    undef;

// make vertex i come first
function _rotateTriangle(t,i) =
    [for (j=[0:2]) t[(j+i)%3]];

function _optimize2Triangles(points,t1,t2) =
    let(i1 = _findTheDistinctVertex(t1,t2))
    i1 == undef ? [t1,t2] :
    let(i2 = _findTheDistinctVertex(t2,t1))
    i2 == undef ? [t1,t2] :
    let(t1 = _rotateTriangle(t1,i1),
        t2 = _rotateTriangle(t2,i2))
    _doSquare(points,t1[1],t2[0],t2[1],t1[0],optimize=true);

// a greedy optimization for a strip of triangles most of which adjoin one another; written for tail-recursion
function _optimizeTriangles(points,triangles,position=0,optimize=true,iterations=4) =
        !optimize || position >= iterations*len(triangles) ? triangles :
            _optimizeTriangles(points,
                let(
                    n = len(triangles),
                    position1=position%n,
                    position2=(position+1)%n,
                    opt=_optimize2Triangles(points,triangles[position1],triangles[position2]))
                    [for (i=[0:len(triangles)-1])
                        i == position1 ? opt[0] :
                        i == position2 ? opt[1] :
                            triangles[i]],
                position=position+1);
*/

function _removeEmptyTriangles(points,triangles) =
    [for(t=triangles)
        if(true || points[t[0]] != points[t[1]] && points[t[1]] != points[t[2]] && points[t[2]] != points[t[0]]) t];

// n1 and n2 should be fairly small, so this doesn't need
// tail-recursion
// this assumes n1<=n2
function _tubeSegmentTriangles(points,index1,n1,index2,n2,i=0,soFar=[],optimize=true)
    = i>=n2 ? _removeEmptyTriangles(points,soFar) :
            let(i21=i,
                i22=(i+1)%n2,
                i11=floor((i21)*n1/n2+0.5)%n1,
                i12=floor((i22)*n1/n2+0.5)%n1,
                add = i11==i12 ? [[index1+i11,index2+i21,index2+i22]] :
                    _doSquare(points,index1+i11,index2+i21,index2+i22,index1+i12,optimize=optimize))
                _tubeSegmentTriangles(points,index1,n1,index2,n2,i=i+1,soFar=concat(soFar,add),optimize=optimize);

function _tubeSegmentFaces(points,index,n1,n2,optimize=true)
    = n1<n2 ? _tubeSegmentTriangles(points,index,n1,index+n1,n2,optimize=optimize) :
        [for (f=_tubeSegmentTriangles(points,index+n1,n2,index,n1,optimize=optimize)) _reverseTriangle(f)];

function _tubeMiddleFaces(points,counts,subtotals,optimize=true) = [ for (i=[1:len(counts)-1])
           for (face=_tubeSegmentFaces(points,subtotals[i-1],counts[i-1],counts[i],optimize=optimize)) face ];

function _endCaps(counts,subtotals,startCap=true,endCap=true) =
    let( n = len(counts),
         cap1 = counts[0]<=2 || !startCap ? undef : [for(i=[0:counts[0]-1]) i],
         cap2 = counts[n-1]<=2 || !endCap ? undef : [for(i=[counts[n-1]-1:-1:0]) subtotals[n-1]+i] )
       [for (c=[cap1,cap2]) if (c!=undef) c];

function _tubeFaces(sections,startCap=true,endCap=true,optimize=true) =
                let(
        counts = [for (s=sections) len(s)],
        points = _flatten(sections),
        subtotals = _subtotals(counts))
            concat(_tubeMiddleFaces(points,counts,subtotals,optimize=optimize),_endCaps(counts,subtotals,startCap=true,endCap=true));

function _removeDuplicates1(points,soFar=[[],[]]) =
        len(soFar[0]) >= len(points) ? soFar :
            _removeDuplicates1(points,
               let(
                mapSoFar=soFar[0],
                pointsSoFar=soFar[1],
                j=len(mapSoFar),
                k=search([points[j]], pointsSoFar)[0])
                k == []? [concat(mapSoFar,[len(pointsSoFar)]),
                            concat(pointsSoFar,[points[j]])] :
                           [concat(mapSoFar,[k]),pointsSoFar]);

function _removeDuplicates(points, faces) =
    let(fix=_removeDuplicates1(points),
        map=fix[0],
        newPoints=fix[1],
        newFaces=[for(f=faces) [for(v=f) map[v]]])
            [newPoints, newFaces];

function pointsAndFaces(sections,startCap=true,endCap=true,optimize=true) =
        let(
            points0=_flatten(sections),
            faces0=_tubeFaces(sections,startCap=startCap,endCap=endCap,optimize=optimize))
        _removeDuplicates(points0,faces0);

function sectionZ(section,z) = [for(xy=section) [xy[0],xy[1],z]];

function shiftSection(section,delta) = [for(p=section) [for(i=[0:len(delta)-1]) (p[i]==undef?0:p[i])+delta[i]]];

module tubeMesh(sections,startCap=true,endCap=true,optimize=true) {
    pAndF = pointsAndFaces(sections,startCap=startCap,endCap=endCap,optimize=optimize);
    polyhedron(points=pAndF[0],faces=pAndF[1]);
}

// increase number of points from len(section) to n
function _interpolateSection(section,n) =
        let(m=len(section))
        n == m ? section :
        n < m ? undef :
            [for(i=[0:m-1])
                let(cur=floor(i*n/m),
                    k=floor((i+1)*n/m)-cur,
                    i2=(i+1)%m)
                    for(j=[0:k-1])
                        let(t=j/k)
                            section[i]*(1-t)+section[i2]*t];

function arcPoints(r=10,d=undef,start=0,end=180,z=undef) =
            let(r=d==undef?r:d/2,
                n=getPointsAround(abs(end-start)))
                    r*[for(i=[0:n])
                        let(angle=start+i*(end-start)/n) [cos(angle),sin(angle)]];

function ngonPoints(n=4,r=10,d=undef,rotate=0,z=undef) =
            let(r=d==undef?r:d/2)
            z==undef ?
            r*[for(i=[0:n-1]) let(angle=i*360/n+rotate) [cos(angle),sin(angle)]] :
            [for(i=[0:n-1]) let(angle=i*360/n+rotate) [r*cos(angle),r*sin(angle),z]];

function starPoints(n=10,r1=5,r2=10,rotate=0,z=undef) =
          z==undef ?
            [for(i=[0:2*n-1]) let(angle=i*180/n+rotate) (i%2?r1:r2) * [cos(angle),sin(angle)]] :
            [for(i=[0:2*n-1]) let(angle=i*180/n+rotate, r=i%2?r1:r2) [r*cos(angle),r*sin(angle),z]];

function roundedSquarePoints(size=[10,10],radius=2,z=undef) =
    let(n=$fn?$fn:32,
        x=len(size)>=2 ? size[0] : size,
        y=len(size)>=2 ? size[1] : size,
        centers=[[x-radius,y-radius],[radius,y-radius],[radius,radius],[x-radius,radius]],
        section=[for(i=[0:n-1])
            let(center=centers[floor(i*4/n)],
                angle=360*i/n)
            center+radius*[cos(angle),sin(angle)]])
        z==undef ? section : sectionZ(section,z);

function getPointsAround(radius, angle=360) =
    max(3, $fn ? ceil($fn*angle/360) :
        max(floor(0.5+angle/$fa), floor(0.5+2*radius*PI*angle/360/$fs)));

// warning: no guarantee of perfect convexity
module mySphere(r=10,d=undef) {
    GA = 2.39996322972865332 * 180 / PI;
    radius = d==undef ? r : d/2;
    pointsAround = getPointsAround(radius);
    numSlices0 = (pointsAround + pointsAround % 2)/2;
    numSlices = numSlices0 + (numSlices0%2);
    sections = radius*[for(i=[0:numSlices])
                    i == 0 ? [[0,0,-1]] :
                    i == numSlices ? [[0,0,1]] :
                    let(
                        lat = (i-numSlices/2)/(numSlices/2)*90,
                        z1 = sin(lat),
                        r1 = cos(lat),
                        count = max(3,floor(0.5 + pointsAround * abs(r1))))
                        ngonPoints(count,r=r1,z=z1)];
    data = pointsAndFaces(sections,optimize=false);
    polyhedron(points=data[0], faces=data[1]);
}

function twistSectionXY(section,theta) =
    [for (p=section) [for(i=[0:len(p)-1])
        i == 0 ? p[0]*cos(theta)-p[1]*sin(theta) :
        i == 1 ? p[0]*sin(theta)+p[1]*cos(theta) :
        p[i]]];

module morphExtrude(section1,section2,height=undef,twist=0,numSlices=10,curve="t",curveParams=[[]],startCap=true,endCap=true,optimize=false) {

    fc = compileFunction(curve);
    n = max(len(section1),len(section2));

    section1interp = _interpolateSection(section1,n);
    section2interp = _interpolateSection(section2,n);
    sections = height == undef ?
                      [for(i=[0:numSlices])
                        let(t=i/numSlices)
                        (1-t)*section1interp+t*section2interp] :
                      [for(i=[0:numSlices])
                        let(t=i/numSlices,
                            t1=eval(fc,concat([["t",t]],curveParams)),
                            theta = t*twist,
                            section=(1-t1)*section1interp+t1*section2interp)
                        twistSectionXY(sectionZ(section,height*t),theta)];

    tubeMesh(sections,startCap=startCap,endCap=endCap,optimize=false);
}

module cone(r=10,d=undef,height=10) {
    radius = d==undef ? r : d/2;
    pointsAround =
        $fn ? $fn :
        max(3, floor(0.5+360/$fa), floor(0.5+2*radius*PI/$fs));
    morphExtrude(ngonPoints(n=pointsAround,r=radius), [[0,0]], height=height,optimize=false);
}

module prism(base=[[0,0,0],[1,0,0],[0,1,0]], vertical=[0,0,1]) {
    morphExtrude(base,[for(v=base) v+vertical],numSlices=1);
}


//END: use <tubemesh.scad>;



module dummy() {}

nudge = 0.01;

module hemisphere(d=10,r=undef) {
    intersection() {
        sphere(d=d,r=r);
        translate([0,0,d/2+5]) cube((d==undef?2*r:d)+10,center=true);
    }
}

module mushroom() {
    cylinder(d1=baseDiameter, d2=sphereDiameter, h=baseHeight+nudge);
    translate([0,0,baseHeight]) scale([1,1,verticalSphereStretch]) hemisphere(d=sphereDiameter);
}

function rectangle(w,h) =
    [ [-w/2,-h/2], [w/2,-h/2], [w/2,h/2], [-w/2,h/2] ];

difference() {
    mushroom();
    cube([slotWidth+2*slotTolerance,slotThickness+2*slotTolerance,2*slotHeight+slotTolerance], center=true);
    translate([0,0,-nudge])
    morphExtrude(rectangle(slotWidth+2*slotTolerance+2*bottomSlotExtra,slotThickness+2*slotTolerance+2*bottomSlotExtra), rectangle(slotWidth+2*slotTolerance,slotThickness+2*slotTolerance), height=2*bottomSlotExtra);
}
